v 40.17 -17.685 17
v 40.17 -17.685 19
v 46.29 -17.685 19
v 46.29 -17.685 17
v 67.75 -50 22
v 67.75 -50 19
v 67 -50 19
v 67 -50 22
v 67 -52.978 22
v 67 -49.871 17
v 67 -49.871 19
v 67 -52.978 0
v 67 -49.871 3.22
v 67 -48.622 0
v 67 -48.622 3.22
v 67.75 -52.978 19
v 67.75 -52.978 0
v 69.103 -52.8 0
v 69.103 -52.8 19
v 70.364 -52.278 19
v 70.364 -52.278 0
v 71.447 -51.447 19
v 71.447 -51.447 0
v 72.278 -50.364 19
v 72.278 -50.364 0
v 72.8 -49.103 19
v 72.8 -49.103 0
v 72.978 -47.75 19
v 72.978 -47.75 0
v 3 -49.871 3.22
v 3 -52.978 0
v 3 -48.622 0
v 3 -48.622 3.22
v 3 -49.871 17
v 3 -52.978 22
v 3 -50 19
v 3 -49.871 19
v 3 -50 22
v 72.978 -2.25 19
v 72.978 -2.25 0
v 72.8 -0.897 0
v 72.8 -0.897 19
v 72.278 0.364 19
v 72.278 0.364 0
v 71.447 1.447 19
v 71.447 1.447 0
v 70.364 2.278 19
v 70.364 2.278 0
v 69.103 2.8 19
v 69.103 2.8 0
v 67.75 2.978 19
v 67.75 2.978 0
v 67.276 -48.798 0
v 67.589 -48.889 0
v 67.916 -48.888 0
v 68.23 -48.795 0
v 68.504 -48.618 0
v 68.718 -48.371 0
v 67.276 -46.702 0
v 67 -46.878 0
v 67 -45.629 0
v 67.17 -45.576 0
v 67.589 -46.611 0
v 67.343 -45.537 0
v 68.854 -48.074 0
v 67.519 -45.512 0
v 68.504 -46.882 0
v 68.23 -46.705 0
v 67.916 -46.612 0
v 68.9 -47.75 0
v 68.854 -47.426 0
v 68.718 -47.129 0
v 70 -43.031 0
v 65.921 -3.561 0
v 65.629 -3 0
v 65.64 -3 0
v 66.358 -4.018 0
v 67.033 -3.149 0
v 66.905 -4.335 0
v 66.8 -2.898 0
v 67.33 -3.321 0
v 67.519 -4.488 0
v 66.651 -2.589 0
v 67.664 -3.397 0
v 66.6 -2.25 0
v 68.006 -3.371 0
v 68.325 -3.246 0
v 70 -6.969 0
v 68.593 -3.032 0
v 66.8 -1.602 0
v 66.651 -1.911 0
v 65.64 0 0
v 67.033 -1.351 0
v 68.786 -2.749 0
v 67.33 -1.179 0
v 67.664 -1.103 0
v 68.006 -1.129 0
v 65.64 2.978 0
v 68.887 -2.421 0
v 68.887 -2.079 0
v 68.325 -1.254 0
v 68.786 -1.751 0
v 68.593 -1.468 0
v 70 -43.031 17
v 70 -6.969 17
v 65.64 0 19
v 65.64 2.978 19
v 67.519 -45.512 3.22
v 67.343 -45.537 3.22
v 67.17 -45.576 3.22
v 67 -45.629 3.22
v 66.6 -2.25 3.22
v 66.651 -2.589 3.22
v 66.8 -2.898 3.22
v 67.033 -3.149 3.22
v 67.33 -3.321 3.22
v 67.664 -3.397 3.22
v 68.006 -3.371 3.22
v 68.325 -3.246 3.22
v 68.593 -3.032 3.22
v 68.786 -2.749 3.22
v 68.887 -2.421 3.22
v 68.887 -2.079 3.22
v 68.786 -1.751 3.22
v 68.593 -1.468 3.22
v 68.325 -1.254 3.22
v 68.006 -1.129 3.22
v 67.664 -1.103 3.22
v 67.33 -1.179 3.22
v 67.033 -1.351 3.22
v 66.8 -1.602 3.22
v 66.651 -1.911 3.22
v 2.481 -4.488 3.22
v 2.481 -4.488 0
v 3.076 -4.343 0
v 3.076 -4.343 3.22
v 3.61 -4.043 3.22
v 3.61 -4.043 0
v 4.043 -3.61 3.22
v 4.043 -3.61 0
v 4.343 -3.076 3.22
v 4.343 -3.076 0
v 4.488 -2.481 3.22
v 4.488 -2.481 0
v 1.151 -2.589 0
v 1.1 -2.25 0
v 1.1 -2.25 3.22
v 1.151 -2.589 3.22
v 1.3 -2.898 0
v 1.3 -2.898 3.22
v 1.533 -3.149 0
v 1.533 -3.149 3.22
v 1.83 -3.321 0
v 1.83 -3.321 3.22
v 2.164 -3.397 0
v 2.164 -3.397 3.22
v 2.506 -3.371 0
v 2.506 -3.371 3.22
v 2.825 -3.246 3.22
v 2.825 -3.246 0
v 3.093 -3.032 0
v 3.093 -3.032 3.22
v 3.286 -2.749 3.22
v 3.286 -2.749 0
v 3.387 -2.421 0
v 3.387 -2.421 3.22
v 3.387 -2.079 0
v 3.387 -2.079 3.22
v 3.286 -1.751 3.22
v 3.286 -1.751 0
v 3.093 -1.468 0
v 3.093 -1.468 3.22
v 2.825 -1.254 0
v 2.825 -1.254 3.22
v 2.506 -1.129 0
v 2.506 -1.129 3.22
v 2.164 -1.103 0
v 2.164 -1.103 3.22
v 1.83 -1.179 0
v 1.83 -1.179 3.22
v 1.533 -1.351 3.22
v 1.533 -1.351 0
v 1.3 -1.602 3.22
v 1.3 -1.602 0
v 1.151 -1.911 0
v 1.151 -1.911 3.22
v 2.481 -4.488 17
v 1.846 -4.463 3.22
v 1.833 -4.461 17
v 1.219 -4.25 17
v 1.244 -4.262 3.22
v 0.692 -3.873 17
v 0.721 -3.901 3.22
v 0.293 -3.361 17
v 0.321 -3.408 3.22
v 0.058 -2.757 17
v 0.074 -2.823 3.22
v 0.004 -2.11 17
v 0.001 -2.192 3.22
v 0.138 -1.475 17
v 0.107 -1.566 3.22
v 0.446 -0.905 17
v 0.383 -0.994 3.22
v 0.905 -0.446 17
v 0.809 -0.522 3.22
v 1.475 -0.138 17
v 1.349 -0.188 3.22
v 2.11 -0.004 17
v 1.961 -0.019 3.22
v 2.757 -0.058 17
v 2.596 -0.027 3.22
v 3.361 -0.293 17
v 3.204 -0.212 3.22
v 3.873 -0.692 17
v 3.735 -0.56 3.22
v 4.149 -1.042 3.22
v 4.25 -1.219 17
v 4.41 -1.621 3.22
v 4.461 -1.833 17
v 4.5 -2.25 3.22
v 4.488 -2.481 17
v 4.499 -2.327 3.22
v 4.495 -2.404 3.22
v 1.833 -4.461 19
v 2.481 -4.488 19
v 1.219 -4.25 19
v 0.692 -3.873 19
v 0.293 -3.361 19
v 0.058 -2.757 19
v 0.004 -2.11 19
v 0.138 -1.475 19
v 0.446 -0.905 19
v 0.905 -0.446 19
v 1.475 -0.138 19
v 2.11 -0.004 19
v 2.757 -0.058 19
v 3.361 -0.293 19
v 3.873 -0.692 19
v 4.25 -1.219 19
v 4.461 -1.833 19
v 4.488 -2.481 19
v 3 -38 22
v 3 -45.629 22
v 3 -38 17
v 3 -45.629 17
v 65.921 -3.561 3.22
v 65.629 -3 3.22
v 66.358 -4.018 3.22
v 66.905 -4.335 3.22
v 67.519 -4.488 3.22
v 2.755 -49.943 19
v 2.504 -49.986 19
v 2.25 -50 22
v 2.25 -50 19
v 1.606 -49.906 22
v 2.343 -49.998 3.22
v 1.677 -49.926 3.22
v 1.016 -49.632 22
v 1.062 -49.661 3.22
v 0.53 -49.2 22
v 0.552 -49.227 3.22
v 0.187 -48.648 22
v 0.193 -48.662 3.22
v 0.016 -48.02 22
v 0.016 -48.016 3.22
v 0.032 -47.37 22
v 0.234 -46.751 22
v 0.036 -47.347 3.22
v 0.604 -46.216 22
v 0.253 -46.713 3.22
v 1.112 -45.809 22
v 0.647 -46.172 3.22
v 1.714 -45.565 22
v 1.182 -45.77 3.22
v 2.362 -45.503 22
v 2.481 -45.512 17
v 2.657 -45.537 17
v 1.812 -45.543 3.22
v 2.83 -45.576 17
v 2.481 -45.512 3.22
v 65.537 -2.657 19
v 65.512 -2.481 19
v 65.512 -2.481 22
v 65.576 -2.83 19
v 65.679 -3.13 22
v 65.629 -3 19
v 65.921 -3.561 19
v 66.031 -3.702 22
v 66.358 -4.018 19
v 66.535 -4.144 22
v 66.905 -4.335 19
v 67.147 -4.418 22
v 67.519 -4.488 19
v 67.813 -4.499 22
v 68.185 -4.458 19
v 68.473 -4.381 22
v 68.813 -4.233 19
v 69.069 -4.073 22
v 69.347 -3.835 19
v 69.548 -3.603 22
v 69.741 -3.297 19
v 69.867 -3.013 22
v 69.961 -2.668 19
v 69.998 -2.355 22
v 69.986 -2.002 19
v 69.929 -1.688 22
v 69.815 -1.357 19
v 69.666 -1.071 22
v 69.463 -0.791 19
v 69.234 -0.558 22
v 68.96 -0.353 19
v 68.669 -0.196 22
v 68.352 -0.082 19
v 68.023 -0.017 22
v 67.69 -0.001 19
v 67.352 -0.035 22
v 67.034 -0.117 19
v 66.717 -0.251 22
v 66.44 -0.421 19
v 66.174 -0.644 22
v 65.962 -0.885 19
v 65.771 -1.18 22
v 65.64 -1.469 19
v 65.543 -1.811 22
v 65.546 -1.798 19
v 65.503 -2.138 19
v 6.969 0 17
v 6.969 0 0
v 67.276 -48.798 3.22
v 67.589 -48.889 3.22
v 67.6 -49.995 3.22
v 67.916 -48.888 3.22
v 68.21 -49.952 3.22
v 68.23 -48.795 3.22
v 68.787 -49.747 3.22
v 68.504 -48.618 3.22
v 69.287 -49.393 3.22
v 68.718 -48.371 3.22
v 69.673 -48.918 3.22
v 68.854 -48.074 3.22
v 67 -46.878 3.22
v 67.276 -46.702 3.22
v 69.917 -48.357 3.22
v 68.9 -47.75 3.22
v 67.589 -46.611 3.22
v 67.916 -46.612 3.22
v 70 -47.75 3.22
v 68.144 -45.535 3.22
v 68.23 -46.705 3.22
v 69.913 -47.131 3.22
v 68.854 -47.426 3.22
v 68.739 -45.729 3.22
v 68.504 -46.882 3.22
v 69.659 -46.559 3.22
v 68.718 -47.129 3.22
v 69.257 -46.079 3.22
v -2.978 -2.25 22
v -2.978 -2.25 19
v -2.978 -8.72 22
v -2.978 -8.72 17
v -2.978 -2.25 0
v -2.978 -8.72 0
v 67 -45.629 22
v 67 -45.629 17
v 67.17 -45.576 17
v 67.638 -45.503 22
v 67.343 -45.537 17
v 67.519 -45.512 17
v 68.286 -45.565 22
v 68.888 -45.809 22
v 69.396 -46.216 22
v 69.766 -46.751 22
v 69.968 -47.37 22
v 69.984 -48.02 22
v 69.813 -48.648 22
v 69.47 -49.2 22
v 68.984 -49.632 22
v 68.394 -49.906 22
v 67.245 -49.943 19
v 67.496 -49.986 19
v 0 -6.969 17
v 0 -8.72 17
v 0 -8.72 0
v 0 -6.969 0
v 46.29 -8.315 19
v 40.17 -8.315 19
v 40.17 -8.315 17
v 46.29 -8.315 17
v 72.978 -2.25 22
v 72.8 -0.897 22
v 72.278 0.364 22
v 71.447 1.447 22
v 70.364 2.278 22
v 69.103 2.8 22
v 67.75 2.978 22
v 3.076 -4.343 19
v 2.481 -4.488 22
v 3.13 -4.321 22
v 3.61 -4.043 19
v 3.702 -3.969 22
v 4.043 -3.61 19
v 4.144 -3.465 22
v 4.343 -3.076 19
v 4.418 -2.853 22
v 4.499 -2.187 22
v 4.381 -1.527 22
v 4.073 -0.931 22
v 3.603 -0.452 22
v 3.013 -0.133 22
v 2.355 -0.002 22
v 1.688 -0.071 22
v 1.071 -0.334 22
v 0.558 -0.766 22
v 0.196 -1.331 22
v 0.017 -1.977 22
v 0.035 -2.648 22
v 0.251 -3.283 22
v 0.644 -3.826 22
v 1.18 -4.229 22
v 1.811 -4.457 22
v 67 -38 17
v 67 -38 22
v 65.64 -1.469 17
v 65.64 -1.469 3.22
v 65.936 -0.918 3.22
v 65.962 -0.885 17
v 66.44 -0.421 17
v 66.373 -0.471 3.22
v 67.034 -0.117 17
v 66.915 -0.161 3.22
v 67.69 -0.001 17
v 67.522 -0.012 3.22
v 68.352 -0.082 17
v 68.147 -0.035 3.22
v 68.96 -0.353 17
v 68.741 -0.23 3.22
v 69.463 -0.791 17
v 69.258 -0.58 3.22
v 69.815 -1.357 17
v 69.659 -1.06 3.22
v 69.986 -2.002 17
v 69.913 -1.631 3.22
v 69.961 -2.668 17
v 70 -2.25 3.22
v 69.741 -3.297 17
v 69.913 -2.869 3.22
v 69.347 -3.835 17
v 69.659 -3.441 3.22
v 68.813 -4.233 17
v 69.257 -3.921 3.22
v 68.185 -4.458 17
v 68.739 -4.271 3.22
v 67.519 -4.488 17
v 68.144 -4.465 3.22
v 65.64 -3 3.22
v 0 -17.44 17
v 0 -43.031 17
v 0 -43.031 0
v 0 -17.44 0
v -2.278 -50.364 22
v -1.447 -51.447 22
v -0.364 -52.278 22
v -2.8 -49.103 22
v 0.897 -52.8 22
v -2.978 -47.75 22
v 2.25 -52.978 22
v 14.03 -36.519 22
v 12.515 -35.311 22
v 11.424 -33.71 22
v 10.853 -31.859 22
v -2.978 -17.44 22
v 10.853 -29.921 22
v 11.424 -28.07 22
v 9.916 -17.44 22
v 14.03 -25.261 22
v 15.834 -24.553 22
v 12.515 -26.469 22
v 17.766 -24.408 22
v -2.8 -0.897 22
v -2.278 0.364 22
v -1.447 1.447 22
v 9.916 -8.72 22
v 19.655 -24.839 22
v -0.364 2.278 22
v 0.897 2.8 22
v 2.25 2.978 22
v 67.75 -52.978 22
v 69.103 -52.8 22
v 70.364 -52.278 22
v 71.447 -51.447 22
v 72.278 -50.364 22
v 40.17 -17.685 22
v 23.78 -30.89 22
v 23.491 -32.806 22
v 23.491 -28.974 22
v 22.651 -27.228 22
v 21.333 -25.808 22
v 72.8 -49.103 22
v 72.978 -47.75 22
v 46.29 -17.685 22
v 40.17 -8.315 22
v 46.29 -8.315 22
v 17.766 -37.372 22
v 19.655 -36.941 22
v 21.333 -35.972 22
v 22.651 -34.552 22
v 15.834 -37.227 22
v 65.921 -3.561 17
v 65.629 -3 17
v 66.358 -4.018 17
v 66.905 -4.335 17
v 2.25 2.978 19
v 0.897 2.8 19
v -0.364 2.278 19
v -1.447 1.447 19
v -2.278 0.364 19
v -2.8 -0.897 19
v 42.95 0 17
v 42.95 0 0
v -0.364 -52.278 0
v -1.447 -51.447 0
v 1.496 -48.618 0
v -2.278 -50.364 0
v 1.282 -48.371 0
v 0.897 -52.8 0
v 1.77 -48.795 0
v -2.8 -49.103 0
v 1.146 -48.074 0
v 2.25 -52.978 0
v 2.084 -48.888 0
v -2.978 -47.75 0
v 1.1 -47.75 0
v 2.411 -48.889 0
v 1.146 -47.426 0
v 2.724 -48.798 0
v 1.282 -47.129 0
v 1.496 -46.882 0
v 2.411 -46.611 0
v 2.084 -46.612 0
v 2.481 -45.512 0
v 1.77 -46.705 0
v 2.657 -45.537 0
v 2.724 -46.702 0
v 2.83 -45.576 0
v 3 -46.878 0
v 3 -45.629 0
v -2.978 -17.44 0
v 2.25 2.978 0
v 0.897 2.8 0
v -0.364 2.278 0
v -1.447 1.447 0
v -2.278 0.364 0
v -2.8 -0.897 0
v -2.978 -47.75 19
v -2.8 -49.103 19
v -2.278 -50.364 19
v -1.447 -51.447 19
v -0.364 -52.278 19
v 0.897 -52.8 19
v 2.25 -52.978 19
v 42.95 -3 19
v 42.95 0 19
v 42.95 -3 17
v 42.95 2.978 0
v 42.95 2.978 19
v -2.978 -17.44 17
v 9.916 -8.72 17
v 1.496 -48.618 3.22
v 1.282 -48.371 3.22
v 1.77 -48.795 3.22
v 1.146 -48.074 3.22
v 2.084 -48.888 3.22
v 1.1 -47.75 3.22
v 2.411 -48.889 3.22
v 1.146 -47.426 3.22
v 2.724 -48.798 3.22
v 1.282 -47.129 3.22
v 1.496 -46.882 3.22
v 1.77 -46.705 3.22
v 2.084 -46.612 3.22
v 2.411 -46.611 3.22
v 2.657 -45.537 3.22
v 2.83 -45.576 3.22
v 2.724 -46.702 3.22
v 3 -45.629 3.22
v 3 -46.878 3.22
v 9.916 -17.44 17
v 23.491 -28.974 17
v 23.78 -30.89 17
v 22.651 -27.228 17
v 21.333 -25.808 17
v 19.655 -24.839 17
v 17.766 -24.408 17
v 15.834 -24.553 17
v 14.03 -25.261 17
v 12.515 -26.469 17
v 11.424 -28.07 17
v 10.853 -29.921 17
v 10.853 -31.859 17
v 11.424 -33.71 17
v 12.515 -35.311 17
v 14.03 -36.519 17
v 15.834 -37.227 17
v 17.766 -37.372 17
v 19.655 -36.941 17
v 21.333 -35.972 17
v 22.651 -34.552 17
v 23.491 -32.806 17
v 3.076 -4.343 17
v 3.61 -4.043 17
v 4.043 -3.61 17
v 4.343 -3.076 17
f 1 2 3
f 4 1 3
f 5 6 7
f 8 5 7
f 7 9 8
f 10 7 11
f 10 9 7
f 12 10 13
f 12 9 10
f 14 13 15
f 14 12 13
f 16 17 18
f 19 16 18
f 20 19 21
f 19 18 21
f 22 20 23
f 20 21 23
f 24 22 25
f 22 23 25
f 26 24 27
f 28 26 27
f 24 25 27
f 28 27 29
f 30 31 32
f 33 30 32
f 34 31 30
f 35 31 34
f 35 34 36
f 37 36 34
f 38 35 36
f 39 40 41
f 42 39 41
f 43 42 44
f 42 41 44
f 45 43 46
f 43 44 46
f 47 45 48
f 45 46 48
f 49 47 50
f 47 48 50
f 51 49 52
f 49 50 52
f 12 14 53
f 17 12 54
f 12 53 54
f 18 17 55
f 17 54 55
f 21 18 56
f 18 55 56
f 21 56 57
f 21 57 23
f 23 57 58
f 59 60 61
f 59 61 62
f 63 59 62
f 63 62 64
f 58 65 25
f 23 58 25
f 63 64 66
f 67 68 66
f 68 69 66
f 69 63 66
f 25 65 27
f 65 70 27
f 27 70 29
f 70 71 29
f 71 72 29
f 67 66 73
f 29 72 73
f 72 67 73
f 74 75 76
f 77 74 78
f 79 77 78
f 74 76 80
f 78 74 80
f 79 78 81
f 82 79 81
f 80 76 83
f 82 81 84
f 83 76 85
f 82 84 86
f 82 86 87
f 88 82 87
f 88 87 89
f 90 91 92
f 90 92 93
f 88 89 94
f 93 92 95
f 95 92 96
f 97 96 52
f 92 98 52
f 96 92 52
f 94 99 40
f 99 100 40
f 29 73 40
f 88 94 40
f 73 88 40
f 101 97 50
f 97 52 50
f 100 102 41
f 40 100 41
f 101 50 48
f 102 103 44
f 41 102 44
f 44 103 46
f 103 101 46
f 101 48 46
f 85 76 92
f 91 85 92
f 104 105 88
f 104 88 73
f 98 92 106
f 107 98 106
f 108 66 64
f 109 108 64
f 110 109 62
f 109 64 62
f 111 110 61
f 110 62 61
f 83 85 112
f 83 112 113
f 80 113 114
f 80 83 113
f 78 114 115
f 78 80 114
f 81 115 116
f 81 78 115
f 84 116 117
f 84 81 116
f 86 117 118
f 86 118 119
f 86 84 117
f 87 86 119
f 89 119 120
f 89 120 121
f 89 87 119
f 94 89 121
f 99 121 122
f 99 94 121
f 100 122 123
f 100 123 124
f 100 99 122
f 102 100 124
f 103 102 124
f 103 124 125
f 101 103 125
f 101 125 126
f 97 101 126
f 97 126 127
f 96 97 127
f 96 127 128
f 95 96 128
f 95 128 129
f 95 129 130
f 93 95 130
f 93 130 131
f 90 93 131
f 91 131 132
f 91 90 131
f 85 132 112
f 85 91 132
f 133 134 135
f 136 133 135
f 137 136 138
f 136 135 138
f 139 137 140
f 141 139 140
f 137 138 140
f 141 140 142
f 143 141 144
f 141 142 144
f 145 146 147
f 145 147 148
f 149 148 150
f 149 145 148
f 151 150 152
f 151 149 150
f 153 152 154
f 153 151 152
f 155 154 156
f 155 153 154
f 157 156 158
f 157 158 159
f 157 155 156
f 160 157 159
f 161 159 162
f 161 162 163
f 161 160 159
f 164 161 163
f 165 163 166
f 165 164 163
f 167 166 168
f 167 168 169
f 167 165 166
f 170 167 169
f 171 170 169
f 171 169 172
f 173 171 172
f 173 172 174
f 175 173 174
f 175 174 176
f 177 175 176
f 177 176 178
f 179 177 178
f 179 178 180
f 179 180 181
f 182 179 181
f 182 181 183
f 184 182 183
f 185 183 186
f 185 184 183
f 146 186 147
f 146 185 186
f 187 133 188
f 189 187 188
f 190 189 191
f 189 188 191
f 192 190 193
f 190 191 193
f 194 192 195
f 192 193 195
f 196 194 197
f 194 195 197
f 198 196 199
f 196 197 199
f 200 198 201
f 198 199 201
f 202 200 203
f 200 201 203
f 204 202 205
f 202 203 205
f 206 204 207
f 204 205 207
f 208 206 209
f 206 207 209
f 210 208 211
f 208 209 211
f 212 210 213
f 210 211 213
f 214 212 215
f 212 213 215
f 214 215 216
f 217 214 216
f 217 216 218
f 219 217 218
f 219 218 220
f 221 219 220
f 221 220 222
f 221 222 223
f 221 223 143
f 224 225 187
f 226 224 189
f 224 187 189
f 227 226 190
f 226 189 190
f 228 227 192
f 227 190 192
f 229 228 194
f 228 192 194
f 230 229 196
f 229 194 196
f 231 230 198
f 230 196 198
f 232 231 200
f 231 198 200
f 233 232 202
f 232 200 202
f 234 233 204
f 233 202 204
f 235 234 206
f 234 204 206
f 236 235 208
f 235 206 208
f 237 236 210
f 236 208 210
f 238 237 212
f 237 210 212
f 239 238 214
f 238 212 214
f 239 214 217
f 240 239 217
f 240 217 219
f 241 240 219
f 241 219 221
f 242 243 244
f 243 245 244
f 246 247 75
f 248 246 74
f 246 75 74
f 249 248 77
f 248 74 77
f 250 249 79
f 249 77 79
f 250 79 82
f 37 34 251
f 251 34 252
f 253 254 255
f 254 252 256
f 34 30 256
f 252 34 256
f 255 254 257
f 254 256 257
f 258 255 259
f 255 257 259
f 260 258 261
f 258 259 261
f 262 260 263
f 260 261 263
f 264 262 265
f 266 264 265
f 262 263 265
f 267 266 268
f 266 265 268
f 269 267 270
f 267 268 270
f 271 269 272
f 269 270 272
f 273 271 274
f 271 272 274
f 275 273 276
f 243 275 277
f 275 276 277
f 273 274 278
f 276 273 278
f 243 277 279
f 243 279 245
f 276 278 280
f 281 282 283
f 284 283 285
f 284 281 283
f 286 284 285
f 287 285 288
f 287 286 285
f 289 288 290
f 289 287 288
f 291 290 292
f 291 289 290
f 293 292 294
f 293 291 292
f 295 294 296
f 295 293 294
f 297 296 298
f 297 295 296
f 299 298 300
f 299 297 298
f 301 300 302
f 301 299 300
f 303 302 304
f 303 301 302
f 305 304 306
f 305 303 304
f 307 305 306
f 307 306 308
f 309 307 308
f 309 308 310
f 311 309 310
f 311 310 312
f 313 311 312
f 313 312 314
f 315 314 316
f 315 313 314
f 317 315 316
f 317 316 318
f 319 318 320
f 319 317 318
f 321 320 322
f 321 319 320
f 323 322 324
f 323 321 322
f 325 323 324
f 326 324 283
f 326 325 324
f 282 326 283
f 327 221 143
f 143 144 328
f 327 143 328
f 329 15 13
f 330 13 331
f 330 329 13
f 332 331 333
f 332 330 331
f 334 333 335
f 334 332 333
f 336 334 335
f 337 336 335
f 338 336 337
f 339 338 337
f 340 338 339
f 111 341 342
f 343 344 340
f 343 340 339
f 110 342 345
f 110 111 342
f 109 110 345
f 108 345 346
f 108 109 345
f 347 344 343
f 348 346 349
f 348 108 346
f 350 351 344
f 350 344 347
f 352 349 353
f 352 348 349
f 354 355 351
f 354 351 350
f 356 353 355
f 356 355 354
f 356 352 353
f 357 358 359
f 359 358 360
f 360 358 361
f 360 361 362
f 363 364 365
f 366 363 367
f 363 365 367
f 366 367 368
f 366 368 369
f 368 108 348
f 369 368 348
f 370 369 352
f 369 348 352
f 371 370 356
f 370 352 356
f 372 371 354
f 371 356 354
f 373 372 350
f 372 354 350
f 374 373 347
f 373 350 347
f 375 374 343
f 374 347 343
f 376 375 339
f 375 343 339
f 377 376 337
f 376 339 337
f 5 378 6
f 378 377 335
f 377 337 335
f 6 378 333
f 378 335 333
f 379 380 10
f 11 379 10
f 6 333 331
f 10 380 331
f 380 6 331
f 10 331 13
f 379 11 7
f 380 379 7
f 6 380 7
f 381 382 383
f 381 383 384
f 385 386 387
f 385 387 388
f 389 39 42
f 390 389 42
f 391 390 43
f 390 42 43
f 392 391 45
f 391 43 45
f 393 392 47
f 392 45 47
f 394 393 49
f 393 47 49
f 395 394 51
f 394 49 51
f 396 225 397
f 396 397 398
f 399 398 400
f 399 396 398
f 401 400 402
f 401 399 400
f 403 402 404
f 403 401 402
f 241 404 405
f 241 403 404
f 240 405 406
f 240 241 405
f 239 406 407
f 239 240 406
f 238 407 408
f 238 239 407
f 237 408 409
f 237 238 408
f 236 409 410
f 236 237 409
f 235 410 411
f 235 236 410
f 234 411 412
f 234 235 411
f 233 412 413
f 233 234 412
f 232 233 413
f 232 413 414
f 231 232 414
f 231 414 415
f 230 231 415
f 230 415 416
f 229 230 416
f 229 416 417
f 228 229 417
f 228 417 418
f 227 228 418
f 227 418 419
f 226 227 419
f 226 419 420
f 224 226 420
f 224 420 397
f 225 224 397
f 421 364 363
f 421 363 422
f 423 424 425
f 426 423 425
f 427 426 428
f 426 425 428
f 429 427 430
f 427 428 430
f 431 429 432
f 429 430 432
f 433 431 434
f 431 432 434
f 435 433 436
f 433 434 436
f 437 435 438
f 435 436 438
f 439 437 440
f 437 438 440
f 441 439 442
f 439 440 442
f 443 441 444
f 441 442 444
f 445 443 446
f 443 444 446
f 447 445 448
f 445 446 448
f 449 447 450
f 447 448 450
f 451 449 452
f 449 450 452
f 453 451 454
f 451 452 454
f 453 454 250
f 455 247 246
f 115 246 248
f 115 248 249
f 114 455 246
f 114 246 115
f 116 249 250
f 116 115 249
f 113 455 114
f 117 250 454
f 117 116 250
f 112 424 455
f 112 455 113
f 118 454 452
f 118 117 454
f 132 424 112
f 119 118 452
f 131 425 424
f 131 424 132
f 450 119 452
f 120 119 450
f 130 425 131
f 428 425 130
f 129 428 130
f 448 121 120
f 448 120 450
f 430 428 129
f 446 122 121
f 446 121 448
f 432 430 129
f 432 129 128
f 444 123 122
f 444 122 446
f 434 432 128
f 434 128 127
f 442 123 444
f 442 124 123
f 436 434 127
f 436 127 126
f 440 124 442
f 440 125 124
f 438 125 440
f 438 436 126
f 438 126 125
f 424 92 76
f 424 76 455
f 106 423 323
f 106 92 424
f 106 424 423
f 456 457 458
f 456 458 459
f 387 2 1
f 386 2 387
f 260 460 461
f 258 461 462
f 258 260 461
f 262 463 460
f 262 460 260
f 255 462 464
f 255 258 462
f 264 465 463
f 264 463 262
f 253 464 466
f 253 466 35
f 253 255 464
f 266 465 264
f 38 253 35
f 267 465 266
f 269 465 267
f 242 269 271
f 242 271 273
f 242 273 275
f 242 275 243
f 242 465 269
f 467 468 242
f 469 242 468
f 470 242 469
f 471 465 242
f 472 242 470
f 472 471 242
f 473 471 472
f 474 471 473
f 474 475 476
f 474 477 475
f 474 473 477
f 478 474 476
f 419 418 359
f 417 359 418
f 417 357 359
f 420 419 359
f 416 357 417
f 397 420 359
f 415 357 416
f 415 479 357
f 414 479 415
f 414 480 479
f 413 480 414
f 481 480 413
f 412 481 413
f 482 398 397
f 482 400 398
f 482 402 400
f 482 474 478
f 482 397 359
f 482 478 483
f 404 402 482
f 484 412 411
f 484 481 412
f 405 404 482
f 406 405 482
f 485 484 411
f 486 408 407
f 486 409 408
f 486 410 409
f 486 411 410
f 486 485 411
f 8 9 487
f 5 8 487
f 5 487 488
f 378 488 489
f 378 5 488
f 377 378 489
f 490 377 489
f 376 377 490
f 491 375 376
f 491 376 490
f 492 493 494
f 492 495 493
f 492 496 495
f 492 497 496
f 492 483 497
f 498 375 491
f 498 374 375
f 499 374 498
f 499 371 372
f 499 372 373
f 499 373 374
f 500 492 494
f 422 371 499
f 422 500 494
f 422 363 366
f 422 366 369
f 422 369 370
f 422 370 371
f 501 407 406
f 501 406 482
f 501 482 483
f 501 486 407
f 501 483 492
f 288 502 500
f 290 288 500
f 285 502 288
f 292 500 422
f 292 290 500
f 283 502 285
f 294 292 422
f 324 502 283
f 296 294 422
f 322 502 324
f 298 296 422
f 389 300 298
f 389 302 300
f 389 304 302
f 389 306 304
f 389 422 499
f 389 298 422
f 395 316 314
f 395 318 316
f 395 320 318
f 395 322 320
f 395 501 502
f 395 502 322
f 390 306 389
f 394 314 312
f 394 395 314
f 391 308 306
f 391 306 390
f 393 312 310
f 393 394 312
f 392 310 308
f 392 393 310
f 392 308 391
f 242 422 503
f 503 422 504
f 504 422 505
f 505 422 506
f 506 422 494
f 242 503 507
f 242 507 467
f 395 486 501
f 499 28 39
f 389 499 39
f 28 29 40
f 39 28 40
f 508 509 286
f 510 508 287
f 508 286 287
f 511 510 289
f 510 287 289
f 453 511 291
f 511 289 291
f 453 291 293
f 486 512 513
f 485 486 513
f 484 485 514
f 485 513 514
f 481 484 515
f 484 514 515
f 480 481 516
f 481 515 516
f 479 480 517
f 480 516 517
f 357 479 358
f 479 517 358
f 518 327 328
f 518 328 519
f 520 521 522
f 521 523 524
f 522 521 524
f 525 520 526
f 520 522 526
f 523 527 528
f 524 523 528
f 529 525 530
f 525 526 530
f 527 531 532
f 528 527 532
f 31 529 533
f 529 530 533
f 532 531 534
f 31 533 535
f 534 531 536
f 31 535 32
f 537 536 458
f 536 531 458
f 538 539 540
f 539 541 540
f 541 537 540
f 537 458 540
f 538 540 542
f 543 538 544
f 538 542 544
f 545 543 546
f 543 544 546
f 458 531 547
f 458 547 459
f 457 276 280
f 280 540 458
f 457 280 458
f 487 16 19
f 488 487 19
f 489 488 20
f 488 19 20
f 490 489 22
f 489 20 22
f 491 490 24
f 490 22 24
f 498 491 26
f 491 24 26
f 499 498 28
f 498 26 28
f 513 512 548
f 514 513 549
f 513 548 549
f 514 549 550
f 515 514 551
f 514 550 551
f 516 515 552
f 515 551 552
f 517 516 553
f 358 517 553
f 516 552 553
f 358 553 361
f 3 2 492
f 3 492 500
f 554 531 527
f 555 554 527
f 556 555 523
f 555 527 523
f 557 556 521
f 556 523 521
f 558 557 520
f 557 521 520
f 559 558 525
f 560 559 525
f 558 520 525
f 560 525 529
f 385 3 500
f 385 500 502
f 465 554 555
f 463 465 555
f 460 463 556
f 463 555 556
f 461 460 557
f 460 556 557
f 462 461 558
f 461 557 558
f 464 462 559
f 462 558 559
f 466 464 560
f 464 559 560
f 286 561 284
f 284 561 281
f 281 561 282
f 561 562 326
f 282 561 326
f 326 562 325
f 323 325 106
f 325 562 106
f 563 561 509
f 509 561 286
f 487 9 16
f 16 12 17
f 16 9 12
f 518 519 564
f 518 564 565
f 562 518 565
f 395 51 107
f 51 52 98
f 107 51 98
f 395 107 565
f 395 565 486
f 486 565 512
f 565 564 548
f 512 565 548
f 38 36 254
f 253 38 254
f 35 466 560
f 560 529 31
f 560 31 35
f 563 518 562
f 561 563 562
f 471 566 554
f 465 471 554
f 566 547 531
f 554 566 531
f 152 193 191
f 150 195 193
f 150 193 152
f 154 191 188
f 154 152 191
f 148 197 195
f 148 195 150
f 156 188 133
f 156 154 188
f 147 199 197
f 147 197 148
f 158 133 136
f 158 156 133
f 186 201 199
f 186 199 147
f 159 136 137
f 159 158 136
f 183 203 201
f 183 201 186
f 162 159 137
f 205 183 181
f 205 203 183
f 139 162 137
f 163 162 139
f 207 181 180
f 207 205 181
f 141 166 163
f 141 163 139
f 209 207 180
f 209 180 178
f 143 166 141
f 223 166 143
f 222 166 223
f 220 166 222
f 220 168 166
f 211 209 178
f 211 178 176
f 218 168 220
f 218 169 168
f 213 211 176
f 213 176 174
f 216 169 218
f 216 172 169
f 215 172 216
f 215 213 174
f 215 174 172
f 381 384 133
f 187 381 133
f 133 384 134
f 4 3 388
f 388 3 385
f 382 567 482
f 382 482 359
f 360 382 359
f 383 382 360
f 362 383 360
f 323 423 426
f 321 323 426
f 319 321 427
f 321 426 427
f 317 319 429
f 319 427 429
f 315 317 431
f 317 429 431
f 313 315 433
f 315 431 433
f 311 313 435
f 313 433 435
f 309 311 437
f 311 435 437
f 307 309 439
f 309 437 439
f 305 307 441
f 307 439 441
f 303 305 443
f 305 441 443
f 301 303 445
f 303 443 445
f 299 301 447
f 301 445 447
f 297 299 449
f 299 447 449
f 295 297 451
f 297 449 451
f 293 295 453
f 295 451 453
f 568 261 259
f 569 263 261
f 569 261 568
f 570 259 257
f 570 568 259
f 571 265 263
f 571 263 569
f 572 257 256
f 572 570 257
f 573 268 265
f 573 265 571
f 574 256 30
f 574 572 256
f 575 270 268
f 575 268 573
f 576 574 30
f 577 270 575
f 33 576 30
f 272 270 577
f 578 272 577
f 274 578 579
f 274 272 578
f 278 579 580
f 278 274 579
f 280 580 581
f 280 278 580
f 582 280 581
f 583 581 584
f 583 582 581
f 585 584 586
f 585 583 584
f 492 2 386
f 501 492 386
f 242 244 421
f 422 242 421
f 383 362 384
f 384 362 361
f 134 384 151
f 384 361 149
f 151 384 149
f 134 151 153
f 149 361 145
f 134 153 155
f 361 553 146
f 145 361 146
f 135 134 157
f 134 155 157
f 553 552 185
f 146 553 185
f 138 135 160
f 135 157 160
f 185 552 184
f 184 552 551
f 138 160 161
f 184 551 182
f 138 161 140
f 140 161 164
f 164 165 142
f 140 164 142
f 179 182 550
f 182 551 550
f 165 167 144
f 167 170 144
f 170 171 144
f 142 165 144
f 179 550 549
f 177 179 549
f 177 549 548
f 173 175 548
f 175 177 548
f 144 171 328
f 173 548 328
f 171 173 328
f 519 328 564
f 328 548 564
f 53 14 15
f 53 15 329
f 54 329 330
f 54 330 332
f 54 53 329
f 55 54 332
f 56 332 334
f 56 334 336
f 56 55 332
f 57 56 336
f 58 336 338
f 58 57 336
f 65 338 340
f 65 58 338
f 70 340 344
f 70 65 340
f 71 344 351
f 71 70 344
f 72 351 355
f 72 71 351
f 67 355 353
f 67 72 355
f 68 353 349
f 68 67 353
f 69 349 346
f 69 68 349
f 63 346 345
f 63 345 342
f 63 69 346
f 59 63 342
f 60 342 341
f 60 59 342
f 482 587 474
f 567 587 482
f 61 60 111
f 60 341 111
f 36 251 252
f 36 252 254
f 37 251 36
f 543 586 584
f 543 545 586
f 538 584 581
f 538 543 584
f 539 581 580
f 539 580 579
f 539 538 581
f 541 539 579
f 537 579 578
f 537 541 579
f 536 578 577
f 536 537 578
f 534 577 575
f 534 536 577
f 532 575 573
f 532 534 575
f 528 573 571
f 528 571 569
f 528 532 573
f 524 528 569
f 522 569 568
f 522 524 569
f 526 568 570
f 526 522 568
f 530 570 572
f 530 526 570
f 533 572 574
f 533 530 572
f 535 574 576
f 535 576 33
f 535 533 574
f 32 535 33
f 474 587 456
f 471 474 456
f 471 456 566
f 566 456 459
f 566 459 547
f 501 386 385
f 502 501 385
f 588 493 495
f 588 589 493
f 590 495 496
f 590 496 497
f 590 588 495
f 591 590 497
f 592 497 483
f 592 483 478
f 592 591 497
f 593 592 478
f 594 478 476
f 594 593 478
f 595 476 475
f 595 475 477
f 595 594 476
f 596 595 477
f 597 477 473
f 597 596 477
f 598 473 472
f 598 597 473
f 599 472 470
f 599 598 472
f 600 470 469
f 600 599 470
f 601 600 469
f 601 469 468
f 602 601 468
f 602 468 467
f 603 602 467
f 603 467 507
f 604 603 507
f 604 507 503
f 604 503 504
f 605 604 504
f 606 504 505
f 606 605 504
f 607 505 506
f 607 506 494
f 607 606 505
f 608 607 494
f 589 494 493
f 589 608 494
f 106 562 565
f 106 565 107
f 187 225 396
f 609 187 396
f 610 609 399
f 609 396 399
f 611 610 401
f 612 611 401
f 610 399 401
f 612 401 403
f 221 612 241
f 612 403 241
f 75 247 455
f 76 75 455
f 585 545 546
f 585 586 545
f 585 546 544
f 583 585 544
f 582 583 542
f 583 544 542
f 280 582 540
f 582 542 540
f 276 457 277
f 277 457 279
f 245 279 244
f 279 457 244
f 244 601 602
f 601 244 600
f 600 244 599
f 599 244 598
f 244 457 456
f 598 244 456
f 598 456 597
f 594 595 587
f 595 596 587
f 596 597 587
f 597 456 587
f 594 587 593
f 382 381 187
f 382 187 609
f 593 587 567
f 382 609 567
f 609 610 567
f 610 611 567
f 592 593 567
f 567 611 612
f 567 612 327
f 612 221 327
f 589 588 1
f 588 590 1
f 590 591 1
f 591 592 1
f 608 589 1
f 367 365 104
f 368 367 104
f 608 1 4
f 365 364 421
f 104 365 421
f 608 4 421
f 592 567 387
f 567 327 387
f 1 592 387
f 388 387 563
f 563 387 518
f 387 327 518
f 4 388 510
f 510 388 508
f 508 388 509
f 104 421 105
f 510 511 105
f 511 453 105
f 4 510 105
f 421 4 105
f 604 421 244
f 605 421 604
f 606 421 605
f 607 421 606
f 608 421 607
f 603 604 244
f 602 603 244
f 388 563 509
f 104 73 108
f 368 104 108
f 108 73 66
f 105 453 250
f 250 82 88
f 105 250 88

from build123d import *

# Parameters (mm, degrees)
SKETCH1_R                       = 1.15
BOSS_EXTRUDE4_DEPTH             = 3.22
BOSS_EXTRUDE5_DEPTH             = 19
BOSS_EXTRUDE6_DEPTH             = 19
SKETCH3_W                       = 19
SKETCH3_H                       = 8.72
CUT_EXTRUDE1_DEPTH              = 93.159937036
SKETCH2_5_R                     = 6.5
SKETCH2_5_R_2                   = 2.25
SKETCH2_5_W                     = 6.12
SKETCH2_5_H                     = 9.37
BOSS_EXTRUDE9_DEPTH             = 3
BOSS_EXTRUDE9_DEPTH_BACK        = 2
CUT_EXTRUDE8_REACH              = 94.16
SKETCH2_6_W                     = 64
SKETCH2_6_H                     = 14.977988196
CUT_EXTRUDE8_DIRECTION_2_REACH  = 94.16
CUT_EXTRUDE10_REACH             = 94.825
SKETCH4_W                       = 22.69
SKETCH4_H                       = 19
CUT_EXTRUDE10_DIRECTION_2_DEPTH = 3
CUT_EXTRUDE11_REACH             = 93.768
SKETCH5_W                       = 12.894145303
SKETCH5_H                       = 8.72


with BuildPart() as part:
    # Sketch1 → Boss-Extrude4 (new body)
    with BuildSketch(Plane.XY):
        with BuildLine():
            ThreePointArc((2.480923897, -4.488118441), (3.840990258, -3.840990258), (4.488118441, -2.480923897))
            Line((4.488118441, -2.480923897), (2.480923897, -4.488118441))
        make_face()
        with BuildLine():
            Line((2.480923897, -4.488118441), (4.488118441, -2.480923897))
            ThreePointArc((4.488118441, -2.480923897), (4.497027647, -2.365614681), (4.5, -2.25))
            ThreePointArc((4.5, -2.25), (0.579359589, -0.742863438), (2.480923897, -4.488118441))
        make_face()
        with Locations(Location((2.25, -2.25, 0), (0, 0, 180))):
            Circle(SKETCH1_R, mode=Mode.SUBTRACT)
        with BuildLine():
            ThreePointArc((4.5, -47.75), (4.497027647, -47.634385319), (4.488118441, -47.519076103))
            Line((4.488118441, -47.519076103), (2.480923897, -45.511881559))
            ThreePointArc((2.480923897, -45.511881559), (0.579359589, -49.257136562), (4.5, -47.75))
        make_face()
        with Locations(Location((2.25, -47.75, 0), (0, 0, 180))):
            Circle(SKETCH1_R, mode=Mode.SUBTRACT)
        with BuildLine():
            Line((2.480923897, -45.511881559), (4.488118441, -47.519076103))
            ThreePointArc((4.488118441, -47.519076103), (3.840990258, -46.159009742), (2.480923897, -45.511881559))
        make_face()
        with BuildLine():
            Line((67.519076103, -45.511881559), (65.511881559, -47.519076103))
            ThreePointArc((65.511881559, -47.519076103), (67.634385319, -49.997027647), (70, -47.75))
            ThreePointArc((70, -47.75), (69.257136562, -46.079359589), (67.519076103, -45.511881559))
        make_face()
        with Locations(Location((67.75, -47.75, 0), (0, 0, 180))):
            Circle(SKETCH1_R, mode=Mode.SUBTRACT)
        with BuildLine():
            ThreePointArc((67.519076103, -45.511881559), (66.159009742, -46.159009742), (65.511881559, -47.519076103))
            Line((65.511881559, -47.519076103), (67.519076103, -45.511881559))
        make_face()
        with BuildLine():
            ThreePointArc((70, -2.25), (67.634385319, -0.002972353), (65.511881559, -2.480923897))
            Line((65.511881559, -2.480923897), (67.519076103, -4.488118441))
            ThreePointArc((67.519076103, -4.488118441), (69.257136562, -3.920640411), (70, -2.25))
        make_face()
        with Locations(Location((67.75, -2.25, 0), (0, 0, 180))):
            Circle(SKETCH1_R, mode=Mode.SUBTRACT)
        with BuildLine():
            Line((67.519076103, -4.488118441), (65.511881559, -2.480923897))
            ThreePointArc((65.511881559, -2.480923897), (66.159009742, -3.840990258), (67.519076103, -4.488118441))
        make_face()
    extrude(amount=BOSS_EXTRUDE4_DEPTH)

    # Sketch1<6> → Boss-Extrude5 (add)
    with BuildSketch(Plane.XY):
        with BuildLine():
            Line((65.511881559, -47.519076103), (63.030957663, -50))
            ThreePointArc((63.030957663, -50), (71.446745906, -51.446745906), (70, -43.030957663))
            Line((70, -43.030957663), (67.519076103, -45.511881559))
            ThreePointArc((67.519076103, -45.511881559), (69.340990258, -49.340990258), (65.511881559, -47.519076103))
        make_face()
        with BuildLine():
            ThreePointArc((70, -6.969042337), (71.446745906, 1.446745906), (63.030957663, 0))
            Line((63.030957663, 0), (65.511881559, -2.480923897))
            ThreePointArc((65.511881559, -2.480923897), (69.340990258, -0.659009742), (67.519076103, -4.488118441))
            Line((67.519076103, -4.488118441), (70, -6.969042337))
        make_face()
        with BuildLine():
            Line((4.488118441, -2.480923897), (6.969042337, 0))
            ThreePointArc((6.969042337, 0), (-1.446745906, 1.446745906), (0, -6.969042337))
            Line((0, -6.969042337), (2.480923897, -4.488118441))
            ThreePointArc((2.480923897, -4.488118441), (0.659009742, -0.659009742), (4.488118441, -2.480923897))
        make_face()
        with BuildLine():
            ThreePointArc((0, -43.030957663), (-1.446745906, -51.446745906), (6.969042337, -50))
            Line((6.969042337, -50), (4.488118441, -47.519076103))
            ThreePointArc((4.488118441, -47.519076103), (0.659009742, -49.340990258), (2.480923897, -45.511881559))
            Line((2.480923897, -45.511881559), (0, -43.030957663))
        make_face()
    extrude(amount=BOSS_EXTRUDE5_DEPTH)

    # Sketch2 → Boss-Extrude6 (add)
    with BuildSketch(Plane.XY.offset(19)):
        with BuildLine():
            Line((0, -43.030957663), (0, -6.969042337))
            ThreePointArc((0, -6.969042337), (-2.171246093, -5.040061571), (-2.977988196, -2.25))
            Line((-2.977988196, -2.25), (-2.977988196, -47.75))
            ThreePointArc((-2.977988196, -47.75), (-2.171246093, -44.959938429), (0, -43.030957663))
        make_face()
        with BuildLine():
            Line((67.75, 2.977988196), (2.25, 2.977988196))
            ThreePointArc((2.25, 2.977988196), (5.040061571, 2.171246093), (6.969042337, 0))
            Line((6.969042337, 0), (63.030957663, 0))
            ThreePointArc((63.030957663, 0), (64.959938429, 2.171246093), (67.75, 2.977988196))
        make_face()
        with BuildLine():
            Line((2.25, -52.977988196), (67.75, -52.977988196))
            ThreePointArc((67.75, -52.977988196), (64.959938429, -52.171246093), (63.030957663, -50))
            Line((63.030957663, -50), (6.969042337, -50))
            ThreePointArc((6.969042337, -50), (5.040061571, -52.171246093), (2.25, -52.977988196))
        make_face()
        with BuildLine():
            Line((72.977988196, -47.75), (72.977988196, -2.25))
            ThreePointArc((72.977988196, -2.25), (72.171246093, -5.040061571), (70, -6.969042337))
            Line((70, -6.969042337), (70, -43.030957663))
            ThreePointArc((70, -43.030957663), (72.171246093, -44.959938429), (72.977988196, -47.75))
        make_face()
    extrude(amount=-BOSS_EXTRUDE6_DEPTH)

    # Sketch3 → Cut-Extrude1 (cut, through all)
    with BuildSketch(Plane(origin=(0, 0, 0), x_dir=(0, 0, -1), z_dir=(1, 0, 0))):
        with Locations((-9.5, -13.08)):
            Rectangle(SKETCH3_W, SKETCH3_H)
    extrude(amount=-CUT_EXTRUDE1_DEPTH, mode=Mode.SUBTRACT)

    # Sketch2<5> → Boss-Extrude9 (add, two sides)
    with BuildSketch(Plane.XY.offset(19)) as boss_extrude9_sk:
        with BuildLine():
            Line((2.25, -52.977988196), (67.75, -52.977988196))
            ThreePointArc((67.75, -52.977988196), (71.446745906, -51.446745906), (72.977988196, -47.75))
            Line((72.977988196, -47.75), (72.977988196, -2.25))
            ThreePointArc((72.977988196, -2.25), (71.446745906, 1.446745906), (67.75, 2.977988196))
            Line((67.75, 2.977988196), (2.25, 2.977988196))
            ThreePointArc((2.25, 2.977988196), (-1.446745906, 1.446745906), (-2.977988196, -2.25))
            Line((-2.977988196, -2.25), (-2.977988196, -47.75))
            ThreePointArc((-2.977988196, -47.75), (-1.446745906, -51.446745906), (2.25, -52.977988196))
        make_face()
        with BuildLine():
            Line((3, -50), (2.25, -50))
            ThreePointArc((2.25, -50), (0.032403241, -47.369520548), (3, -45.628679656))
            Line((3, -45.628679656), (3, -50))
        make_face(mode=Mode.SUBTRACT)
        with Locations((17.28, -30.89)):
            Circle(SKETCH2_5_R, mode=Mode.SUBTRACT)
        with BuildLine():
            ThreePointArc((67, -45.628679656), (69.967596759, -47.369520548), (67.75, -50))
            Line((67.75, -50), (67, -50))
            Line((67, -50), (67, -45.628679656))
        make_face(mode=Mode.SUBTRACT)
        with Locations(Location((2.25, -2.25, 0), (0, 0, 275.890801568))):
            Circle(SKETCH2_5_R_2, mode=Mode.SUBTRACT)
        with Locations((43.23, -13)):
            Rectangle(SKETCH2_5_W, SKETCH2_5_H, mode=Mode.SUBTRACT)
        with Locations(Location((67.75, -2.25, 0), (0, 0, 185.890801568))):
            Circle(SKETCH2_5_R_2, mode=Mode.SUBTRACT)
    extrude(amount=BOSS_EXTRUDE9_DEPTH)
    extrude(boss_extrude9_sk.sketch, amount=-BOSS_EXTRUDE9_DEPTH_BACK)

    # Sketch2<6> → Cut-Extrude8 (cut, up to next)
    with BuildSketch(Plane.XY.offset(19), mode=Mode.PRIVATE) as cut_extrude8_sk1:
        with Locations((35, -45.488994098)):
            Rectangle(SKETCH2_6_W, SKETCH2_6_H)
    cut_extrude8_tool1 = extrude(cut_extrude8_sk1.sketch, amount=-CUT_EXTRUDE8_REACH, mode=Mode.PRIVATE) & part.part
    add(cut_extrude8_tool1.solids().sort_by_distance((35, -45.488994, 19))[0], mode=Mode.SUBTRACT)

    # Sketch2<6> → Cut-Extrude8 direction 2 (cut, up to next)
    with BuildSketch(Plane.XY.offset(19), mode=Mode.PRIVATE) as cut_extrude8_direction_2_sk1:
        with Locations((35, -45.488994098)):
            Rectangle(SKETCH2_6_W, SKETCH2_6_H)
    cut_extrude8_direction_2_tool1 = extrude(cut_extrude8_direction_2_sk1.sketch, amount=CUT_EXTRUDE8_DIRECTION_2_REACH, mode=Mode.PRIVATE) & part.part
    add(cut_extrude8_direction_2_tool1.solids().sort_by_distance((35, -45.488994, 19))[0], mode=Mode.SUBTRACT)

    # Sketch4 → Cut-Extrude10 (cut, up to next)
    with BuildSketch(Plane.XZ, mode=Mode.PRIVATE) as cut_extrude10_sk1:
        with Locations((54.295, 9.5)):
            Rectangle(SKETCH4_W, SKETCH4_H)
    cut_extrude10_tool1 = extrude(cut_extrude10_sk1.sketch, amount=-CUT_EXTRUDE10_REACH, mode=Mode.PRIVATE) & part.part
    add(cut_extrude10_tool1.solids().sort_by_distance((54.295, 0, 9.5))[0], mode=Mode.SUBTRACT)

    # Sketch4 → Cut-Extrude10 direction 2 (cut)
    with BuildSketch(Plane.XZ):
        with Locations((54.295, 9.5)):
            Rectangle(SKETCH4_W, SKETCH4_H)
    extrude(amount=CUT_EXTRUDE10_DIRECTION_2_DEPTH, mode=Mode.SUBTRACT)

    # Sketch5 → Cut-Extrude11 (cut, up to next)
    with BuildSketch(Plane(origin=(0, 0, 17), x_dir=(-1, 0, 0), z_dir=(0, 0, -1)), mode=Mode.PRIVATE) as cut_extrude11_sk1:
        with Locations((-3.469084455, -13.08)):
            Rectangle(SKETCH5_W, SKETCH5_H)
    cut_extrude11_tool1 = extrude(cut_extrude11_sk1.sketch, amount=-CUT_EXTRUDE11_REACH, mode=Mode.PRIVATE) & part.part
    add(cut_extrude11_tool1.solids().sort_by_distance((3.469084, -13.08, 17))[0], mode=Mode.SUBTRACT)


solid = part.part
